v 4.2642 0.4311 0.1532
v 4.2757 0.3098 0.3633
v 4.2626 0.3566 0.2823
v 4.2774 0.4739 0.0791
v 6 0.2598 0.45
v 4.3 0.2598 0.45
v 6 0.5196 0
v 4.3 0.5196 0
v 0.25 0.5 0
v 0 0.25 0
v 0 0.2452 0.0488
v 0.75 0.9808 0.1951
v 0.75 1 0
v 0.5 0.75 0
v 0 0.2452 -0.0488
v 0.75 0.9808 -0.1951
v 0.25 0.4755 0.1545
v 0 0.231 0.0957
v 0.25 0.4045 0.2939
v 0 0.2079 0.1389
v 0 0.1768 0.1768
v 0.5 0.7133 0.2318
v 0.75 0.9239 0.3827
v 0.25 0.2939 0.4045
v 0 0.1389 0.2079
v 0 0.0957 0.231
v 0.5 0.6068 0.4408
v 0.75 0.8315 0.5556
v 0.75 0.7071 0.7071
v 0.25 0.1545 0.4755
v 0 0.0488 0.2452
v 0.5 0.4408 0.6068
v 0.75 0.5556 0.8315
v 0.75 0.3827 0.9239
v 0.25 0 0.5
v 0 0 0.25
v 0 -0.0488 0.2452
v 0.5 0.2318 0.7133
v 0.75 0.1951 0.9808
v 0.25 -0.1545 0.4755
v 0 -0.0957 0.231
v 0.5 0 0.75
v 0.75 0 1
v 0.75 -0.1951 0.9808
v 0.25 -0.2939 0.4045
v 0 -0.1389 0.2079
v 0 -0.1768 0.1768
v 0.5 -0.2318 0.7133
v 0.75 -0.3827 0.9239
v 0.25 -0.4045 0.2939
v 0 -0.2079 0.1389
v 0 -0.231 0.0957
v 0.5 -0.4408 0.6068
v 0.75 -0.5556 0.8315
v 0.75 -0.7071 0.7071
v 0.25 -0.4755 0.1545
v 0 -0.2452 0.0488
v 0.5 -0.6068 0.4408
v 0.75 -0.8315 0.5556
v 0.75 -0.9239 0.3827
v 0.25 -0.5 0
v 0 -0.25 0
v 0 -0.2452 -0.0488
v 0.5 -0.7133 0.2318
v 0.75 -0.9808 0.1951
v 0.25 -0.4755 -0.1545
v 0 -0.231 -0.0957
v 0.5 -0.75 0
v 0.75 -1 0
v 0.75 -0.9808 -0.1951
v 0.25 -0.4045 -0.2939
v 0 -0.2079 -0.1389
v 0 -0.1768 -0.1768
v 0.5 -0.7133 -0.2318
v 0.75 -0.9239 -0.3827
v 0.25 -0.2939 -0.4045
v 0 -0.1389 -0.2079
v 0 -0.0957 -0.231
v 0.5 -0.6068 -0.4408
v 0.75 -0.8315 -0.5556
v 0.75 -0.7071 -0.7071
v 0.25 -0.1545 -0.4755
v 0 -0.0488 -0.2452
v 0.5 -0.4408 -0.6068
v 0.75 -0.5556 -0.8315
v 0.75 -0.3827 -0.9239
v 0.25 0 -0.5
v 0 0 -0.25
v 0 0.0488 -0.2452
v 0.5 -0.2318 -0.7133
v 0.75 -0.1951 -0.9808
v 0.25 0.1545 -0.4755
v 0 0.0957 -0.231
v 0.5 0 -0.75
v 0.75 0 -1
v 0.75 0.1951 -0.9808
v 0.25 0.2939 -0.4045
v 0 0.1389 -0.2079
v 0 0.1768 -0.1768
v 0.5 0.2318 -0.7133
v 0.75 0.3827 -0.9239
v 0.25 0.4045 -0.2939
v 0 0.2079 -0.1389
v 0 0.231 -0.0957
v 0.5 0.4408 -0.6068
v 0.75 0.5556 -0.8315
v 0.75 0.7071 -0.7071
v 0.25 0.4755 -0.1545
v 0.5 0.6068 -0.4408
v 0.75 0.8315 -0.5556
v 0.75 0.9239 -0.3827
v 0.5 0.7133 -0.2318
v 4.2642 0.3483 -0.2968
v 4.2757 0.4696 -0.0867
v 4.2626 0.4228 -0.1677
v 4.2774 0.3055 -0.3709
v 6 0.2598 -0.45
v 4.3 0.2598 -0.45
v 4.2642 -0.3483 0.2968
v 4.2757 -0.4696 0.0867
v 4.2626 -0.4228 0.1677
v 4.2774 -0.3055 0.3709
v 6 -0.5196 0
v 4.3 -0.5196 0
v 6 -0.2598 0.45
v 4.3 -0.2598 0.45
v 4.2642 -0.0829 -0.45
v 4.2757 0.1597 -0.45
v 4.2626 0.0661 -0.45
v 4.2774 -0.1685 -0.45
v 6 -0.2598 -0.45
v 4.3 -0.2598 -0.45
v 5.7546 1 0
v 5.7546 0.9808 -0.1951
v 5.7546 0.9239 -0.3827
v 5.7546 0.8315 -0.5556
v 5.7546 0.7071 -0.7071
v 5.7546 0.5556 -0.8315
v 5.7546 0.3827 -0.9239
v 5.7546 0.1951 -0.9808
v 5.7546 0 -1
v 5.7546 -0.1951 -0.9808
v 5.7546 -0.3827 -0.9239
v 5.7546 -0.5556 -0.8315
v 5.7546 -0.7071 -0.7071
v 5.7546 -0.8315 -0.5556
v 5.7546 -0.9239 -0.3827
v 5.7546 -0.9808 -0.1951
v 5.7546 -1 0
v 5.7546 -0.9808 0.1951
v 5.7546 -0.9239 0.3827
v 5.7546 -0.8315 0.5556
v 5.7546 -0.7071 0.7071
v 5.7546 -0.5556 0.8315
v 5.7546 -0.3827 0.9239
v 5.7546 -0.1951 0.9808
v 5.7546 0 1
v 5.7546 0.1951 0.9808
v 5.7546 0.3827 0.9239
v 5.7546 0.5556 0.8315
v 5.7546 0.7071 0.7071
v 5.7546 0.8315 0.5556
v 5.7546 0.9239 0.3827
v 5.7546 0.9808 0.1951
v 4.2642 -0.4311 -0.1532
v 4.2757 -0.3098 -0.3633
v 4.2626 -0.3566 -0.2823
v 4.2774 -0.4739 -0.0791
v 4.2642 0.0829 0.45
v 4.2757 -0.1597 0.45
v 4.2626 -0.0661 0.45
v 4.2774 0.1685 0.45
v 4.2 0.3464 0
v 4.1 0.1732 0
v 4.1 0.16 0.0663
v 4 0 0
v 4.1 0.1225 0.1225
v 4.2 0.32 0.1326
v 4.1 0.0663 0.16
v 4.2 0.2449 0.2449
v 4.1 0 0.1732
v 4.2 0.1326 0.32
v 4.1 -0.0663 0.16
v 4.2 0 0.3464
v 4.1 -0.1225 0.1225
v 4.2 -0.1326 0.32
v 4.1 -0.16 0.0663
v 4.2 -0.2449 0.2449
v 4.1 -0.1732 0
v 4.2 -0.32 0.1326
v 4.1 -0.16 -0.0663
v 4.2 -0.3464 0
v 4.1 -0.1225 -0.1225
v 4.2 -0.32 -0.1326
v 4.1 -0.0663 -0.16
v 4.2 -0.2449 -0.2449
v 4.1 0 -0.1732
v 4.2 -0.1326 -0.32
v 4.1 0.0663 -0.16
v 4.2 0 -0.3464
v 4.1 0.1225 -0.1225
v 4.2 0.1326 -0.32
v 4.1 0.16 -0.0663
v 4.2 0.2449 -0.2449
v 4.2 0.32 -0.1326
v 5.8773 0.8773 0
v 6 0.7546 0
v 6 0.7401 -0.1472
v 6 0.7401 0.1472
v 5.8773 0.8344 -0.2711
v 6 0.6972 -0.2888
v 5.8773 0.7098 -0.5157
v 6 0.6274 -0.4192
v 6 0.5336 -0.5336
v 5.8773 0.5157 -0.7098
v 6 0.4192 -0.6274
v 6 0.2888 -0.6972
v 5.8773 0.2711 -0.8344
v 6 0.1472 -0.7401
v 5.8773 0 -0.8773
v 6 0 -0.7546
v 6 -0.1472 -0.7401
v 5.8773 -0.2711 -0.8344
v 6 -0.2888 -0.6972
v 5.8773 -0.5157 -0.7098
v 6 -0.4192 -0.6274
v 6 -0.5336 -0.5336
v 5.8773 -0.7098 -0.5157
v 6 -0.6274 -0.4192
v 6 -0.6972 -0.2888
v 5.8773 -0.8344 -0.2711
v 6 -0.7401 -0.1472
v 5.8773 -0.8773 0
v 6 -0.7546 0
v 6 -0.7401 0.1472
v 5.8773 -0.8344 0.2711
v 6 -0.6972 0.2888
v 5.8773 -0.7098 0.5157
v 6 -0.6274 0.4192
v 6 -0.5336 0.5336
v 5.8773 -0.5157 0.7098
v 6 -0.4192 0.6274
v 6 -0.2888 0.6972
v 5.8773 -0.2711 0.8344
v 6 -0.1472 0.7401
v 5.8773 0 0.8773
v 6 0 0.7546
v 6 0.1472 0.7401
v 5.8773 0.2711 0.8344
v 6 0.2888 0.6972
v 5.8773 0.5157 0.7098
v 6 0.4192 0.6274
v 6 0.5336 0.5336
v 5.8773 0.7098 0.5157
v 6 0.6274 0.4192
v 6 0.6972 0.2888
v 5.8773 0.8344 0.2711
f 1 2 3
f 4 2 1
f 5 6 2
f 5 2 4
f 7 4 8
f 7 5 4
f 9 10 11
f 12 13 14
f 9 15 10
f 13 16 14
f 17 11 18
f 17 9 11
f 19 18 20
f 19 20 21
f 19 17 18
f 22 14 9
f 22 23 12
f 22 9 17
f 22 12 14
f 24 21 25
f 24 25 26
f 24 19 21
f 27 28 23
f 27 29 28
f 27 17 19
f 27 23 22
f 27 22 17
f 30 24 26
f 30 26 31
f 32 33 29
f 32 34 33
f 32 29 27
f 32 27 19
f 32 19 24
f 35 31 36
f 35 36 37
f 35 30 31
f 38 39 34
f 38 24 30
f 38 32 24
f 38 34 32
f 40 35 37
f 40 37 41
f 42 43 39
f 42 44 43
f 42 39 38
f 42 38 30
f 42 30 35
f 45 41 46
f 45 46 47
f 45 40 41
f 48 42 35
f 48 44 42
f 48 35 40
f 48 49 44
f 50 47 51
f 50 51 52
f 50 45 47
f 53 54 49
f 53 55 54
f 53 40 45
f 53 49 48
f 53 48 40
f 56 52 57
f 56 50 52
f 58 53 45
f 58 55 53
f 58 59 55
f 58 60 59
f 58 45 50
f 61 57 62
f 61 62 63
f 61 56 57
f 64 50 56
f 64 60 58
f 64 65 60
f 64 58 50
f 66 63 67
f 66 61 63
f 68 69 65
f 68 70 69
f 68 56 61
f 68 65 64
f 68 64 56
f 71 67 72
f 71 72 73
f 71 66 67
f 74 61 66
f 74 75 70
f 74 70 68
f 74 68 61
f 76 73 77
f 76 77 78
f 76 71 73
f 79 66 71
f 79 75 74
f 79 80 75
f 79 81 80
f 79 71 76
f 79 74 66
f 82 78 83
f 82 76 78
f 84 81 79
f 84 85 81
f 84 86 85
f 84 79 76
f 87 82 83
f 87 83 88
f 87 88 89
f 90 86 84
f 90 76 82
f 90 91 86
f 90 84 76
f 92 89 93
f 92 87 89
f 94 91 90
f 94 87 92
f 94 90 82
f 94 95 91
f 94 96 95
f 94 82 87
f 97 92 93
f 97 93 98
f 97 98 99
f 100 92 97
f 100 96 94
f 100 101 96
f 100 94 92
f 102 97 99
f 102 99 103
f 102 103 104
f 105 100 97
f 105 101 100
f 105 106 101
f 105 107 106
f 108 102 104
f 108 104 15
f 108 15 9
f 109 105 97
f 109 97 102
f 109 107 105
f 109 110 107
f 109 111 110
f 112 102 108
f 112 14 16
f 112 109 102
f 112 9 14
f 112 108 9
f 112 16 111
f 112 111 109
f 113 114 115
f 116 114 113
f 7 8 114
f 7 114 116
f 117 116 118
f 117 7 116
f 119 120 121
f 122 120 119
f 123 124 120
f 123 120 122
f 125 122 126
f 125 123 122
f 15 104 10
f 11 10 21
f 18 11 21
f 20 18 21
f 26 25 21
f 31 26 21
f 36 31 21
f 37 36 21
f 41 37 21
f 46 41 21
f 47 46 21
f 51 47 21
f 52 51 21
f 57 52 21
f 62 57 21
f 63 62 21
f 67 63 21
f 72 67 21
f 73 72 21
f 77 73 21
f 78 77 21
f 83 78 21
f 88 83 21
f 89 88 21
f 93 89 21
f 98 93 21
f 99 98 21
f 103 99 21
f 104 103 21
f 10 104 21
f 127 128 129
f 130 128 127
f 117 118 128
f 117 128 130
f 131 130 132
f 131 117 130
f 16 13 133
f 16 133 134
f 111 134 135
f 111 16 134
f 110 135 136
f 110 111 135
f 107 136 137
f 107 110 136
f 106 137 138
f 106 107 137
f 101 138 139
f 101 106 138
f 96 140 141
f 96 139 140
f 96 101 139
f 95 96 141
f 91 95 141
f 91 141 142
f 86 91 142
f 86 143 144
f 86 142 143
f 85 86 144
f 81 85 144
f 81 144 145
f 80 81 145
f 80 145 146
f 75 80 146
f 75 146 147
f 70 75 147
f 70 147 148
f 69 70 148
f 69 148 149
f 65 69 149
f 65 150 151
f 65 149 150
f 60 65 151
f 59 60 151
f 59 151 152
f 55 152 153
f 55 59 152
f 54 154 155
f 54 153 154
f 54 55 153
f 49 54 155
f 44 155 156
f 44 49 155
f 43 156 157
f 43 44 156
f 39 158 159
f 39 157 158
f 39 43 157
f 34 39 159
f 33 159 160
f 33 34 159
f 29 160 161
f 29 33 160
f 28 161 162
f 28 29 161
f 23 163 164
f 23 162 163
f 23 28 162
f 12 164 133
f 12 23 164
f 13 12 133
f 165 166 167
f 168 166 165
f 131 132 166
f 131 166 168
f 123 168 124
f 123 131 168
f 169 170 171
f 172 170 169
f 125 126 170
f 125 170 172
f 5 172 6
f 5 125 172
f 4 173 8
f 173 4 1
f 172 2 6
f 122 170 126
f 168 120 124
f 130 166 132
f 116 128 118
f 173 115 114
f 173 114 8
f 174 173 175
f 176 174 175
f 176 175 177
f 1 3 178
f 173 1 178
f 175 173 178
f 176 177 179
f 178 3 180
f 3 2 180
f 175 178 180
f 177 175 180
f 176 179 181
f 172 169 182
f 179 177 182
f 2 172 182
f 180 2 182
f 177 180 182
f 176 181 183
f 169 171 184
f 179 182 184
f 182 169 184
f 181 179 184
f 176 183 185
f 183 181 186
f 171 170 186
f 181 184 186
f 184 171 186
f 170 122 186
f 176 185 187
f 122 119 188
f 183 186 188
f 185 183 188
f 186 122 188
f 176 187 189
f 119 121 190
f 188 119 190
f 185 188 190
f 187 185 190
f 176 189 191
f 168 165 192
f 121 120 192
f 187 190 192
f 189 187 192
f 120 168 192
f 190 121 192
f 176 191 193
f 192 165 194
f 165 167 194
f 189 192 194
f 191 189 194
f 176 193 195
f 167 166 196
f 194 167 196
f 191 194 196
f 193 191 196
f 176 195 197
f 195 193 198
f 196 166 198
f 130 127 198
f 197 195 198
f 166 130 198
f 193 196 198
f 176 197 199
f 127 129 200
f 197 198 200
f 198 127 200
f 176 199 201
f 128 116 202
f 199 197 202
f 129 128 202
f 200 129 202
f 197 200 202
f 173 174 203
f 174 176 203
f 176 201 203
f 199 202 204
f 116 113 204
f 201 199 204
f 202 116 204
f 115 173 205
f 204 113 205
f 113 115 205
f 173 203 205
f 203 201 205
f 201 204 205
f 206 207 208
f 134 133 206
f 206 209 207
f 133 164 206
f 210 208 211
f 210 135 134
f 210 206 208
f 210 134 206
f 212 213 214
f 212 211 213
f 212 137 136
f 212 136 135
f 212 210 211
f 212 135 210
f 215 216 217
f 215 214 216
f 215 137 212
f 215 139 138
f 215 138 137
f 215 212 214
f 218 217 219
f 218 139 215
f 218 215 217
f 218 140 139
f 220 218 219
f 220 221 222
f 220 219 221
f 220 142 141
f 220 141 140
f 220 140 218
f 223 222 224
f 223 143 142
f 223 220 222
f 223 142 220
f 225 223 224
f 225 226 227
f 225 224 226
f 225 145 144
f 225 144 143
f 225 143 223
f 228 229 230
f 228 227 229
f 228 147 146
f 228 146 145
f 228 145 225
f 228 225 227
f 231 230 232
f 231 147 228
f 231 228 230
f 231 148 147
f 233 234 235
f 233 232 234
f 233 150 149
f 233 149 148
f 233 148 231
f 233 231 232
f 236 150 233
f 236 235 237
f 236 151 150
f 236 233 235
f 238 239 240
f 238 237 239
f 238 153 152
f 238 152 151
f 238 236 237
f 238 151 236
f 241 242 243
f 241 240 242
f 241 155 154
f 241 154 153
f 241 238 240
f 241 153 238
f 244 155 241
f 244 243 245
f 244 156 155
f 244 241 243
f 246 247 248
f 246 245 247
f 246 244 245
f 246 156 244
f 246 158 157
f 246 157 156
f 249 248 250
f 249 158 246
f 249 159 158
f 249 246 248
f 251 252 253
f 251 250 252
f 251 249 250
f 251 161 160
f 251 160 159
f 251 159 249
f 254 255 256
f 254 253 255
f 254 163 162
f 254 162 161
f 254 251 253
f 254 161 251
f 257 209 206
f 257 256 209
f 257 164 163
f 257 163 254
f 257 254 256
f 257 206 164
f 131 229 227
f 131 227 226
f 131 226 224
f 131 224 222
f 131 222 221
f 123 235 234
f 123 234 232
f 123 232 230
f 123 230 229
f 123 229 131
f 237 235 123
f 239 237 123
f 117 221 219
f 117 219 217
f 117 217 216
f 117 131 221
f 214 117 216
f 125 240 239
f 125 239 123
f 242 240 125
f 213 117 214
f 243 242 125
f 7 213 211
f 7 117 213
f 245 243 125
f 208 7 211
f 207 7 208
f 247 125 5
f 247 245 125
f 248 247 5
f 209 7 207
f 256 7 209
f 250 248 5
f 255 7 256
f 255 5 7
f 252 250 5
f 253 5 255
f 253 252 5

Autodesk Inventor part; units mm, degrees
ref_plane "YZ Plane" through (0, 0, 0) normal (1, 0, 0) x (0, 1, 0)
ref_plane "XZ Plane" through (0, 0, 0) normal (0, 1, 0) x (-1, 0, 0)
sketch "Sketch1" plane through (0, 0, 0) normal (0, 0, 1) x (1, 0, 0)
  line L0 (0, 0) -> (4, 0)
  line L1 (6, 0.5196) -> (6, 1)
  line L2 (6, 1) -> (0, 1)
  line L3 (6, 0.5196) -> (4.3, 0.5196)
  line L4 (4.3, 0.5196) -> (4, 0)
  line L5 (0, -0.2) -> (0, 1.2) projected
  line L6 (0, 1) -> (0, 0)
  dimension "d0" = 1.7
  dimension "d1" = 60
  dimension "d2" = 2
  dimension "d3" = 1.0392
  dimension "d5" = 6
revolve "Body" add sketch "Sketch1" angle 360 about axis through (0, 0, 0) along (1, 0, 0)
sketch "Sketch2" plane through (6, 0, 0) normal (1, 0, 0) x (0, 1, 0)
  circle A0 centre (0, 0) radius 0.5196 projected
  line L0 (-0.2598, 0.45) -> (0.2598, 0.45)
  line L1 (0.2598, 0.45) -> (0.5196, 0)
  line L2 (0.5196, 0) -> (0.2598, -0.45)
  line L3 (0.2598, -0.45) -> (-0.2598, -0.45)
  line L4 (-0.2598, -0.45) -> (-0.5196, 0)
  line L5 (-0.5196, 0) -> (-0.2598, 0.45)
  point P0 (0, 0)
  point P1 (0, 0)
extrude "Slot" add sketch "Sketch2" against normal up to next contours L1 A0 | A0 L2 | L0 A0 | A0 L3 | L5 A0 | A0 L4
thread "Thread" size "M2x0.4" class "6g" standard "ISO Metric profile" length 6
chamfer "Chamfer1" distance 0.75 angle 45 1 edges at (0, -1, 0) measured on face at (4, 0.9871, -0.1604)
chamfer "Chamfer2" distance 0.2454 angle 45 1 edges at (6, -1, 0) measured on face at (4.25, 0.9871, -0.1604)
ref_plane "Work Plane1" through (3, 0, 0) normal (0, 0, 1) x (1, 0, 0)
equation "\"d0\" = INTI"
equation "\"d2\" = NND"
equation "\"d3\" = 1.1547 * SW"
equation "\"d5\" = NLG"
equation "\"d12\" = NLG"
equation "\"d9\" = FAWI"
equation "\"d10\" = -0.5 * GD1 + 0.5 * NND"
equation "\"d11\" = FAWI"
equation "\"d35\" = -0.5 * GD1 + 0.5 * NND"
equation "\"NND\" = 2"
equation "\"NLG\" = 6"
equation "\"INTI\" = 1.7"
equation "\"FAWI\" = 45deg"
equation "\"SW\" = 0.9"
equation "\"GD1\" = THREADDIA - 1.2269 * PTC"
equation "\"FAWI1\" = 45deg"
equation "\"SPD\" = 0.5"
equation "\"GUL\" = 0.61345 * PTC"
equation "\"TOA\" = 30deg"
equation "\"THREADDIA\" = 2"
equation "\"PTC\" = 0.4"
equation "\"GAL\" = 0.61345 * PTC"
equation "\"E0\" = 1.155 * SW"
properties part number "ISO 4027 - M2 x 6" material "Stainless Steel, 440C"
